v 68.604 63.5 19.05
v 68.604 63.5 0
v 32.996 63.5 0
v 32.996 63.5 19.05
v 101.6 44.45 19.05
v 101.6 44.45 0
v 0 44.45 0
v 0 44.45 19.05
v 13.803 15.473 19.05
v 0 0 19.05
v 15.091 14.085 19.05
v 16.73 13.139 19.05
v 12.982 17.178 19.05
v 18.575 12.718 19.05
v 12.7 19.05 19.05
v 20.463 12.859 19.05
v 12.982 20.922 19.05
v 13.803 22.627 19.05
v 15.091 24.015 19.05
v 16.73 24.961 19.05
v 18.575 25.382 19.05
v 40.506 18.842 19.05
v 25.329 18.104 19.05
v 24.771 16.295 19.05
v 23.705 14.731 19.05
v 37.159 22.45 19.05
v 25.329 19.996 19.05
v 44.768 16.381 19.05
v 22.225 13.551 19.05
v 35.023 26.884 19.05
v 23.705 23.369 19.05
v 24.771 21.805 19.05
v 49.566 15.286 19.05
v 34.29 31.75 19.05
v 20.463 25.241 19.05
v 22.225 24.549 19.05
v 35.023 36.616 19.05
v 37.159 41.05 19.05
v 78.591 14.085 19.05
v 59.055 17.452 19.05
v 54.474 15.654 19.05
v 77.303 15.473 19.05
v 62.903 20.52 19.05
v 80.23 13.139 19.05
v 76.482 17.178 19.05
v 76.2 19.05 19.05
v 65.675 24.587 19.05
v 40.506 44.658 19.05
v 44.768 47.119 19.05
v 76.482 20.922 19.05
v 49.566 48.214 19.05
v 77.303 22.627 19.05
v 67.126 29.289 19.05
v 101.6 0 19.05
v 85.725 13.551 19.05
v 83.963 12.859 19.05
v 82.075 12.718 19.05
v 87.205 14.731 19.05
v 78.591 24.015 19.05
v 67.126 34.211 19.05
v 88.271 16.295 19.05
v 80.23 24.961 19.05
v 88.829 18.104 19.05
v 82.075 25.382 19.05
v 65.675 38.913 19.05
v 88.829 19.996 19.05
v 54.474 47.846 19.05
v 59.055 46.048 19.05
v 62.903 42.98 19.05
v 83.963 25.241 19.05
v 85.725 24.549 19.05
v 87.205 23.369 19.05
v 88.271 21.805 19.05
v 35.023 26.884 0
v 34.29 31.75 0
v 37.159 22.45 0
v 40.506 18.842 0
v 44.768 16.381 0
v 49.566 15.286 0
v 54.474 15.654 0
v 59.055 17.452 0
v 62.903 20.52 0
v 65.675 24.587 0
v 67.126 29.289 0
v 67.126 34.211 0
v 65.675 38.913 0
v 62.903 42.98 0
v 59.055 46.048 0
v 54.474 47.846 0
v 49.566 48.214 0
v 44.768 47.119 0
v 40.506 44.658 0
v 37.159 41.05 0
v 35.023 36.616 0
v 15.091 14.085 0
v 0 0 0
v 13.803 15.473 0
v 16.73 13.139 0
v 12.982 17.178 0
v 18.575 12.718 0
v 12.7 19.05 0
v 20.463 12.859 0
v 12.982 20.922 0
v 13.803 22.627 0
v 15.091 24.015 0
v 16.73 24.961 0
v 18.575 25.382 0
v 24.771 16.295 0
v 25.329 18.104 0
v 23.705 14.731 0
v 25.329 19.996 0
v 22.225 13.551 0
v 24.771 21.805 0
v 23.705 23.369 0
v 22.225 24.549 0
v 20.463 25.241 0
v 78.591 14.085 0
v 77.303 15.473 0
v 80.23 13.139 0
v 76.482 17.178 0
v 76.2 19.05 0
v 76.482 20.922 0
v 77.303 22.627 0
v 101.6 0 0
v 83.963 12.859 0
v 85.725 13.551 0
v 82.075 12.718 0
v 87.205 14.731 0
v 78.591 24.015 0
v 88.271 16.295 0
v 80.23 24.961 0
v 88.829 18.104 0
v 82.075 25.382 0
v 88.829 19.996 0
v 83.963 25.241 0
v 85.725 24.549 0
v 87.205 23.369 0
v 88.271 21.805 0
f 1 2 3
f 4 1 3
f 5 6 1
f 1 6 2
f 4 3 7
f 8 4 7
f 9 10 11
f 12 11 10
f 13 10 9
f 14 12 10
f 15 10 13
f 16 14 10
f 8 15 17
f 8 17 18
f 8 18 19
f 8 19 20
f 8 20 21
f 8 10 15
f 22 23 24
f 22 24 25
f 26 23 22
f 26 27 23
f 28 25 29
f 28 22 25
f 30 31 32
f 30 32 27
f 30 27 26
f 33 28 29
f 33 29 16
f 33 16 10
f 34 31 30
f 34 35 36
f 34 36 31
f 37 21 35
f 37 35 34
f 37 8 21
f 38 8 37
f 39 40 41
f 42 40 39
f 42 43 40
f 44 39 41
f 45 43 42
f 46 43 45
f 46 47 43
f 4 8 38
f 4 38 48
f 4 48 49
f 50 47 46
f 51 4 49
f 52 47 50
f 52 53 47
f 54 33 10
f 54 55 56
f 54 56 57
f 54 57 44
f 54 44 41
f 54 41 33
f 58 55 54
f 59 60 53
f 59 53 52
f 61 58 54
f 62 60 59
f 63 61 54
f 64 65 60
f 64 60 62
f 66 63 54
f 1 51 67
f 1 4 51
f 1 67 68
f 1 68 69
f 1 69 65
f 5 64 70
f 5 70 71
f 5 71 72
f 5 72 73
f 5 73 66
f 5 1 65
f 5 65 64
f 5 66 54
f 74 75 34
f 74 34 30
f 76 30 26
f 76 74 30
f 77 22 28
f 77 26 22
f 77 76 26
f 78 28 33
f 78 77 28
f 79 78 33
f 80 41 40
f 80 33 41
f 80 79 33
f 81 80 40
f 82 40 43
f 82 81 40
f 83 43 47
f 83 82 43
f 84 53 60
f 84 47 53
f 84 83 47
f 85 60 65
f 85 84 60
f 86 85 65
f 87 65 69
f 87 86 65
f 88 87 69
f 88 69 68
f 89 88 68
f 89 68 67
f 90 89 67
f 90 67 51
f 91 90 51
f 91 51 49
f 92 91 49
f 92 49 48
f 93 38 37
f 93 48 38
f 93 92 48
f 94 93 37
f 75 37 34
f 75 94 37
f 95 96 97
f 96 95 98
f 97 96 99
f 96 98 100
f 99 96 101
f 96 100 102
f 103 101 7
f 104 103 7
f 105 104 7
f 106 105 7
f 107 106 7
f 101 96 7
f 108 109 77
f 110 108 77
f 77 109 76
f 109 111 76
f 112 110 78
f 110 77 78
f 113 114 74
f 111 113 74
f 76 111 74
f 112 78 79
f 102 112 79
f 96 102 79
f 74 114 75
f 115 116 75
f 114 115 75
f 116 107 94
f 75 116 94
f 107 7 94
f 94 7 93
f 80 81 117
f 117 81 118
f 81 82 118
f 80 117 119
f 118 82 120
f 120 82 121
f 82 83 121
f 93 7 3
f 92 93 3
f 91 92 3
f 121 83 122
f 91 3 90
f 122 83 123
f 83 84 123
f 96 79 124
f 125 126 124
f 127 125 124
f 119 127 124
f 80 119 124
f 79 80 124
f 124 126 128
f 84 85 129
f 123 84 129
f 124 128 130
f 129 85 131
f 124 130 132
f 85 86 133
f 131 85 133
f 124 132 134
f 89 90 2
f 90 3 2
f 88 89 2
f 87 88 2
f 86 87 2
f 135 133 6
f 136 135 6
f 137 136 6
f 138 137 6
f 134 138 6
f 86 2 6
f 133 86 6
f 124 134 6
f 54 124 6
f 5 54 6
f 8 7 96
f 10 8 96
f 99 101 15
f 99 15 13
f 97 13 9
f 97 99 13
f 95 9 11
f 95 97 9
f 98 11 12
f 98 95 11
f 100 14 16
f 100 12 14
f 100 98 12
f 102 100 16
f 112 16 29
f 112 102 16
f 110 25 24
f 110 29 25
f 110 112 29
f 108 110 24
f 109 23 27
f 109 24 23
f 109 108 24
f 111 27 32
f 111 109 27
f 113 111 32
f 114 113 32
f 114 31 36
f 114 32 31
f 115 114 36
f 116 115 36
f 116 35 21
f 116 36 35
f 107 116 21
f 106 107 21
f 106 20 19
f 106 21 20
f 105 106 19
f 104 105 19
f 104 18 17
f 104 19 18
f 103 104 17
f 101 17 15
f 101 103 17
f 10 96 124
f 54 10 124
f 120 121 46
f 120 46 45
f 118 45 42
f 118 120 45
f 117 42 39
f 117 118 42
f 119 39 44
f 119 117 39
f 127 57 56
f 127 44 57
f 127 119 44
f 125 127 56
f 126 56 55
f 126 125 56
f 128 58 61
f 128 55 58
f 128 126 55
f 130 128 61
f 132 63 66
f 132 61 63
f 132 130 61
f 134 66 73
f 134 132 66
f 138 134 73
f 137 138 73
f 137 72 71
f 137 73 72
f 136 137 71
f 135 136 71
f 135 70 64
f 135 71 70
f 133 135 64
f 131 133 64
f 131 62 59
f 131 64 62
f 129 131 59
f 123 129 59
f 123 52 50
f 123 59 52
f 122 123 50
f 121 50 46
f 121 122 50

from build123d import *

# Parameters (mm, degrees)
BOSS_EXTRUDE1_DEPTH     = 19.05
CUT_EXTRUDE3_DEPTH      = 122.316579658
CUT_EXTRUDE3_DEPTH_BACK = 122.316579658
SKETCH2_R               = 6.35
SKETCH2_R_2             = 16.51


with BuildPart() as part:
    # Sketch1 → Boss-Extrude1 (new body)
    with BuildSketch(Plane.XY):
        Polygon((0, 0), (101.6, 0), (101.6, 44.45), (68.604432116, 63.5), (32.995567884, 63.5), (0, 44.45), align=None)
    extrude(amount=BOSS_EXTRUDE1_DEPTH)

    # Sketch2 → Cut-Extrude3 (cut, two sides: drawn at the far end of the back side and taken through both)
    with BuildSketch(Plane.XY.offset(-CUT_EXTRUDE3_DEPTH_BACK)):
        with Locations(Location((19.05, 19.05, 0), (0, 0, 180))):
            Circle(SKETCH2_R)
        with Locations(Location((82.55, 19.05, 0), (0, 0, 180))):
            Circle(SKETCH2_R)
        with Locations(Location((50.8, 31.75, 0), (0, 0, 180))):
            Circle(SKETCH2_R_2)
    extrude(amount=CUT_EXTRUDE3_DEPTH + CUT_EXTRUDE3_DEPTH_BACK, mode=Mode.SUBTRACT)


solid = part.part
